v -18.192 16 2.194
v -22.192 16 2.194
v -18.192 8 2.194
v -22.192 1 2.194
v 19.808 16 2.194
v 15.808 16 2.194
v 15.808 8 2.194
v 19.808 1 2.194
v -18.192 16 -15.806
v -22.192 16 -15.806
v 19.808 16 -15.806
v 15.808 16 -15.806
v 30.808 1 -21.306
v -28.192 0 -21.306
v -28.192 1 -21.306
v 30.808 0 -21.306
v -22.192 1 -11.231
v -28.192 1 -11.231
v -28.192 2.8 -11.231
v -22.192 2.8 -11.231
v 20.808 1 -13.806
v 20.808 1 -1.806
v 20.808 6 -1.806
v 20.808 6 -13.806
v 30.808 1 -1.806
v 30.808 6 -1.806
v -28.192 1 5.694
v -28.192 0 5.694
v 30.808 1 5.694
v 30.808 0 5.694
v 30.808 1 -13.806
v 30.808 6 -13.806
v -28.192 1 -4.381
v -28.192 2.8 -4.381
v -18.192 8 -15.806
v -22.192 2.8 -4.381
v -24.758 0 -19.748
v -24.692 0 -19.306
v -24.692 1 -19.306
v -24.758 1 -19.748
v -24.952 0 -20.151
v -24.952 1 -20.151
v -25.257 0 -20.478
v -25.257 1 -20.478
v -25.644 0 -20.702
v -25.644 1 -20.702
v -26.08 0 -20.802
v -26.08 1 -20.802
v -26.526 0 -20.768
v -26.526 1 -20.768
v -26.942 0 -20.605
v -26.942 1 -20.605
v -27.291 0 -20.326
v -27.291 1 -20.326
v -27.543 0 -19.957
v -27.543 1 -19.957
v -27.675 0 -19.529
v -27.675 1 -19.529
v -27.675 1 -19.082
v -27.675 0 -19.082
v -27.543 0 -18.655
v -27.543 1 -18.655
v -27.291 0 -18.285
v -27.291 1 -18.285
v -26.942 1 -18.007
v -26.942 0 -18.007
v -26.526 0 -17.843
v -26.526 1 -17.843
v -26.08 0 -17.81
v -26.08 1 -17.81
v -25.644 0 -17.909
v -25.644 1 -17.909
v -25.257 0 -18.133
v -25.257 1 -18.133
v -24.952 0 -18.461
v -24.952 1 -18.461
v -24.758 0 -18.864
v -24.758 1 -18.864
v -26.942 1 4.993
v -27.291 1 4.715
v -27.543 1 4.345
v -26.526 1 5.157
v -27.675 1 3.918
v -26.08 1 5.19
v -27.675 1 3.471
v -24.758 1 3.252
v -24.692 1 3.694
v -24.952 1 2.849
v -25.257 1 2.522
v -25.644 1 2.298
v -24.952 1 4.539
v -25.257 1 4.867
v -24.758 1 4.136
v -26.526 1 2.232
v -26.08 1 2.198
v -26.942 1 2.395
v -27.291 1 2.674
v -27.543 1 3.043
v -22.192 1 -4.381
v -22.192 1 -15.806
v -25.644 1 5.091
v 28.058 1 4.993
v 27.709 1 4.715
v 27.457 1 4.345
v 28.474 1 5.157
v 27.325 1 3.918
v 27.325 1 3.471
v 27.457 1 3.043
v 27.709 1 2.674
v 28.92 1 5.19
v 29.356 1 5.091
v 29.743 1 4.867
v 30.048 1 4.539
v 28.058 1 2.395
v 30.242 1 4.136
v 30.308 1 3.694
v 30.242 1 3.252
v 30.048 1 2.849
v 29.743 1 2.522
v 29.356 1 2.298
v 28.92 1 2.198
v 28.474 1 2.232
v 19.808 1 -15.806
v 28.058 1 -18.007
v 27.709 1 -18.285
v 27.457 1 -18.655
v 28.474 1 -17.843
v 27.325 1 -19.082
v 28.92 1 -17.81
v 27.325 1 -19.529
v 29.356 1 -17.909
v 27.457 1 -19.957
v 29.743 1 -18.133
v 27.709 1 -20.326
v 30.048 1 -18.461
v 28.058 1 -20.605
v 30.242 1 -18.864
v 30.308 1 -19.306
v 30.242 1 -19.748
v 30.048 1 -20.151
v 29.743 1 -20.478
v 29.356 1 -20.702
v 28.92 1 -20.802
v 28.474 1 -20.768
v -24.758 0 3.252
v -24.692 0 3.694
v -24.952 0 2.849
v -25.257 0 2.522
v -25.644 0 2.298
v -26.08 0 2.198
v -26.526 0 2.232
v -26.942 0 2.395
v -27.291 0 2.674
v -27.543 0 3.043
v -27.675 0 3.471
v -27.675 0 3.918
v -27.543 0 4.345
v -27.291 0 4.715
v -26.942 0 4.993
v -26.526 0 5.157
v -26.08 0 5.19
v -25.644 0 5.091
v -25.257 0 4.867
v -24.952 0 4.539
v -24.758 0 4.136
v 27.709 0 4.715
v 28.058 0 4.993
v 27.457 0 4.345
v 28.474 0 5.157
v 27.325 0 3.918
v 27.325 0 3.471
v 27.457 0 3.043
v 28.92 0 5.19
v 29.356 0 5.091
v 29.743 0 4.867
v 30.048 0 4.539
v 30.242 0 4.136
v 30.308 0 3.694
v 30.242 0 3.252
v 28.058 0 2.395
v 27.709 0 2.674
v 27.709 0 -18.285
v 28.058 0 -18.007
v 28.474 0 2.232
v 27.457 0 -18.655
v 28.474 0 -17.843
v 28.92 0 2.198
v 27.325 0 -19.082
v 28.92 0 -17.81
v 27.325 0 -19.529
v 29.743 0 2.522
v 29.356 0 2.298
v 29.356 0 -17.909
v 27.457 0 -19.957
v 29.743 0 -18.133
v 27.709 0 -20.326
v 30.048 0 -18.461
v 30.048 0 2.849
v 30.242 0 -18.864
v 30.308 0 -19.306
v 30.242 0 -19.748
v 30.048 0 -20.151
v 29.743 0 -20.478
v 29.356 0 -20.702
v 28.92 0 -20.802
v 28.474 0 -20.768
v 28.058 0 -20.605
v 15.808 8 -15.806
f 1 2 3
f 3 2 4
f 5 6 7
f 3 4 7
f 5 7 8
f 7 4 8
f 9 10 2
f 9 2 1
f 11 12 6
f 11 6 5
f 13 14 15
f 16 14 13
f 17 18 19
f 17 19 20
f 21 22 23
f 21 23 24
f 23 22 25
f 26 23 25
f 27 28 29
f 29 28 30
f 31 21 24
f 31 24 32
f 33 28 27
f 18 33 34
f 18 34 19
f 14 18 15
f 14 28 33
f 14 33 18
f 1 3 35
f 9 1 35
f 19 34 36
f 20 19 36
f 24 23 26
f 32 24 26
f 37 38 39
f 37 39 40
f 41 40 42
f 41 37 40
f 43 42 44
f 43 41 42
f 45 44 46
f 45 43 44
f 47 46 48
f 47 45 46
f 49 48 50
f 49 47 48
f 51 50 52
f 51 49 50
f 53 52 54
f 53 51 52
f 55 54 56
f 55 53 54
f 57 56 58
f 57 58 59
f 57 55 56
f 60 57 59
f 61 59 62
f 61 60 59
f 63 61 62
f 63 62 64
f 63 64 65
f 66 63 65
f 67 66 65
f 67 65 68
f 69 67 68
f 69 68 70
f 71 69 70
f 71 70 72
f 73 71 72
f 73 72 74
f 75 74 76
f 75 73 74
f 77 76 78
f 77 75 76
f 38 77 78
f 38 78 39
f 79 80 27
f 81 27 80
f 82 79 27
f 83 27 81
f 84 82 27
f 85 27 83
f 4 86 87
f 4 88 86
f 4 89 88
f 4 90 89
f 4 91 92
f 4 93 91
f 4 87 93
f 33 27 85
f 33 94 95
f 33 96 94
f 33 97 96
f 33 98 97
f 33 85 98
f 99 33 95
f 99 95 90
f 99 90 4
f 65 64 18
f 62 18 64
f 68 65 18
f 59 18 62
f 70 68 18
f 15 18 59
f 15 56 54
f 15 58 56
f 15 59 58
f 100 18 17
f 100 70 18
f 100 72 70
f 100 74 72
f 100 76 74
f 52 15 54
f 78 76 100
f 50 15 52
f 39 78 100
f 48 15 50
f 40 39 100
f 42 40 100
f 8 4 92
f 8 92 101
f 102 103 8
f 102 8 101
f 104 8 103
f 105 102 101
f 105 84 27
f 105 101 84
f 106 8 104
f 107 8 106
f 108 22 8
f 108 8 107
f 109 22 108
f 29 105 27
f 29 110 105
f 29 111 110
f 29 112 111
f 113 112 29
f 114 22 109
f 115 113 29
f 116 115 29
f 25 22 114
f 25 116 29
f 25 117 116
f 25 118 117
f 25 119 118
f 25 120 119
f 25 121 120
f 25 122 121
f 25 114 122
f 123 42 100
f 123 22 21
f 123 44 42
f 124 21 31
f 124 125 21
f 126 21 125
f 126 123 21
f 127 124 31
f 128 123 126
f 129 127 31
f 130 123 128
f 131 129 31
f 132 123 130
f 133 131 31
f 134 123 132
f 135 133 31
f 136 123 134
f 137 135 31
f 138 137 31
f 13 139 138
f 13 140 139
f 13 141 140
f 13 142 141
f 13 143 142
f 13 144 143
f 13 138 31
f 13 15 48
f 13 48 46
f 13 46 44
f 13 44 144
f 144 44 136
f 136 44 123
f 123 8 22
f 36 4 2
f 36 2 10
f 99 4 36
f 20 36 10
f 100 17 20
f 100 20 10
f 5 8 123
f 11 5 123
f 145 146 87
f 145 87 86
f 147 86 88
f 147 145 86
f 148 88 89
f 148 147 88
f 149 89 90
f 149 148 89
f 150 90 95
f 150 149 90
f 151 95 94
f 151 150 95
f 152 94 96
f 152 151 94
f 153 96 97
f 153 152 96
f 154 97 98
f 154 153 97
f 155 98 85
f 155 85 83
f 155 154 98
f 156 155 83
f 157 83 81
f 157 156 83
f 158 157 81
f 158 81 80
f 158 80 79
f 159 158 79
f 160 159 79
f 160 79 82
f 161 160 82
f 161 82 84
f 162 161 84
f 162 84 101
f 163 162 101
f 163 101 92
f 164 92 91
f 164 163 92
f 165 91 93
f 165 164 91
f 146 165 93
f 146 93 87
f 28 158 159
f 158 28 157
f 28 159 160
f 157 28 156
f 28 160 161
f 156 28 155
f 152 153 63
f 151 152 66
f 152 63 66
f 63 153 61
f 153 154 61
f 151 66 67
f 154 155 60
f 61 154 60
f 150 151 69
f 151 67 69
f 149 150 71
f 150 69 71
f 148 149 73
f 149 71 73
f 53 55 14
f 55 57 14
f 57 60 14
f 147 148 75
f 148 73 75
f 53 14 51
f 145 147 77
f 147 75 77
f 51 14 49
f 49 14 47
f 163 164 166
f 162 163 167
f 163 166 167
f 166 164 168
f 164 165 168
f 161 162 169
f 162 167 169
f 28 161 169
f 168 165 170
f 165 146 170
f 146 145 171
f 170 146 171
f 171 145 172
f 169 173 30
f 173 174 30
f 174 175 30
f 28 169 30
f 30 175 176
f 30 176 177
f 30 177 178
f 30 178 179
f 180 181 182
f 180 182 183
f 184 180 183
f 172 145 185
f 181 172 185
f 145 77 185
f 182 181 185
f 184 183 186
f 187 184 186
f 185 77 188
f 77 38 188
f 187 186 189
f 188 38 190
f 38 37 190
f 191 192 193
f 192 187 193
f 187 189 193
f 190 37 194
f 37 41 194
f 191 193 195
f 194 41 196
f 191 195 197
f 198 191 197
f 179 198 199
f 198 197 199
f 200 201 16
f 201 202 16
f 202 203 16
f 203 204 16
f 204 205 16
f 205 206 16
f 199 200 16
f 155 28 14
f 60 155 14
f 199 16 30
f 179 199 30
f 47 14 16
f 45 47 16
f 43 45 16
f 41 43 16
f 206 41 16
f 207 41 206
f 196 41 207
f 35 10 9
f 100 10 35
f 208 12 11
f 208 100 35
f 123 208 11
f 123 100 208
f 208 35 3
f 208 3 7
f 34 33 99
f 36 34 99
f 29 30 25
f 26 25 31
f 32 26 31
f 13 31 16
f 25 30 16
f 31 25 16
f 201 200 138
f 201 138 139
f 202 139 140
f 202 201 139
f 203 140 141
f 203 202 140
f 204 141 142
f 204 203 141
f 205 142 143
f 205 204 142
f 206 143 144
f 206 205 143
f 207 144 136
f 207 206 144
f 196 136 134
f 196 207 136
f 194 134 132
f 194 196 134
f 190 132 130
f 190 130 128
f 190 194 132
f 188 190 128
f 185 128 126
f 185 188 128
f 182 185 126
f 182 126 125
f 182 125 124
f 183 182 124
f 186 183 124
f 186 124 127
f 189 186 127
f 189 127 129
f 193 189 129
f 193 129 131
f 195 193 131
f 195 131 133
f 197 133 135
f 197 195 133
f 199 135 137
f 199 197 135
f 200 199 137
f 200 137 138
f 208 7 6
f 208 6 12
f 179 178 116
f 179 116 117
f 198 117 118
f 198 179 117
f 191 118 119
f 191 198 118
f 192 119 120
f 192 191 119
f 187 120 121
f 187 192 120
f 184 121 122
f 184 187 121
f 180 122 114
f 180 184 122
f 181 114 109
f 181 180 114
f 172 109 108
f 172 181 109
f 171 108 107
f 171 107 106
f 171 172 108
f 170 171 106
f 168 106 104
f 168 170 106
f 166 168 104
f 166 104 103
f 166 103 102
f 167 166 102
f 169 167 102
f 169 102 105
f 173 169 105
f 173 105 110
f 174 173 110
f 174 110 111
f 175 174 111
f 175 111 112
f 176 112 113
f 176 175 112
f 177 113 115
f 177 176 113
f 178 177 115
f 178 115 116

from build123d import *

# Parameters (mm, degrees)
SKETCH1_W           = 59
SKETCH1_H           = 27
SKETCH1_R           = 1.5
BOSS_EXTRUDE1_DEPTH = 1
SKETCH2_W           = 34
SKETCH2_H           = 18
BOSS_EXTRUDE2_DEPTH = 7
SKETCH3_W           = 4
SKETCH3_H           = 18
BOSS_EXTRUDE3_DEPTH = 15
SKETCH4_W           = 4
SKETCH4_H           = 18
BOSS_EXTRUDE4_DEPTH = 15
SKETCH7_W           = 10
SKETCH7_H           = 12
BOSS_EXTRUDE7_DEPTH = 5
SKETCH8_W           = 6
SKETCH8_H           = 6.85
BOSS_EXTRUDE8_DEPTH = 1.8


with BuildPart() as part:
    # Sketch1 → Boss-Extrude1 (new body)
    with BuildSketch(Plane(origin=(0, 0, 0), x_dir=(1, 0, 0), z_dir=(0, 1, 0))):
        with Locations((1.308219178, 7.805712308)):
            Rectangle(SKETCH1_W, SKETCH1_H)
        with Locations((-26.191780822, -3.694287692)):
            Circle(SKETCH1_R, mode=Mode.SUBTRACT)
        with Locations((-26.191780822, 19.305712308)):
            Circle(SKETCH1_R, mode=Mode.SUBTRACT)
        with Locations((28.808219178, 19.305712308)):
            Circle(SKETCH1_R, mode=Mode.SUBTRACT)
        with Locations((28.808219178, -3.694287692)):
            Circle(SKETCH1_R, mode=Mode.SUBTRACT)
    extrude(amount=BOSS_EXTRUDE1_DEPTH)

    # Sketch2 → Boss-Extrude2 (add)
    with BuildSketch(Plane(origin=(0, 1, 0), x_dir=(1, 0, 0), z_dir=(0, 1, 0))):
        with Locations((-1.191780822, 6.805712308)):
            Rectangle(SKETCH2_W, SKETCH2_H)
    extrude(amount=BOSS_EXTRUDE2_DEPTH)

    # Sketch3 → Boss-Extrude3 (add)
    with BuildSketch(Plane(origin=(0, 1, 0), x_dir=(1, 0, 0), z_dir=(0, 1, 0))):
        with Locations((-20.191780822, 6.805712308)):
            Rectangle(SKETCH3_W, SKETCH3_H)
    extrude(amount=BOSS_EXTRUDE3_DEPTH)

    # Sketch4 → Boss-Extrude4 (add)
    with BuildSketch(Plane(origin=(0, 1, 0), x_dir=(1, 0, 0), z_dir=(0, 1, 0))):
        with Locations((17.808219178, 6.805712308)):
            Rectangle(SKETCH4_W, SKETCH4_H)
    extrude(amount=BOSS_EXTRUDE4_DEPTH)

    # Sketch7 → Boss-Extrude7 (add)
    with BuildSketch(Plane(origin=(0, 1, 0), x_dir=(1, 0, 0), z_dir=(0, 1, 0))):
        with Locations((25.808219178, 7.805712308)):
            Rectangle(SKETCH7_W, SKETCH7_H)
    extrude(amount=BOSS_EXTRUDE7_DEPTH)

    # Sketch8 → Boss-Extrude8 (add)
    with BuildSketch(Plane(origin=(0, 1, 0), x_dir=(1, 0, 0), z_dir=(0, 1, 0))):
        with Locations((-25.191780822, 7.805712308)):
            Rectangle(SKETCH8_W, SKETCH8_H)
    extrude(amount=BOSS_EXTRUDE8_DEPTH)


solid = part.part
